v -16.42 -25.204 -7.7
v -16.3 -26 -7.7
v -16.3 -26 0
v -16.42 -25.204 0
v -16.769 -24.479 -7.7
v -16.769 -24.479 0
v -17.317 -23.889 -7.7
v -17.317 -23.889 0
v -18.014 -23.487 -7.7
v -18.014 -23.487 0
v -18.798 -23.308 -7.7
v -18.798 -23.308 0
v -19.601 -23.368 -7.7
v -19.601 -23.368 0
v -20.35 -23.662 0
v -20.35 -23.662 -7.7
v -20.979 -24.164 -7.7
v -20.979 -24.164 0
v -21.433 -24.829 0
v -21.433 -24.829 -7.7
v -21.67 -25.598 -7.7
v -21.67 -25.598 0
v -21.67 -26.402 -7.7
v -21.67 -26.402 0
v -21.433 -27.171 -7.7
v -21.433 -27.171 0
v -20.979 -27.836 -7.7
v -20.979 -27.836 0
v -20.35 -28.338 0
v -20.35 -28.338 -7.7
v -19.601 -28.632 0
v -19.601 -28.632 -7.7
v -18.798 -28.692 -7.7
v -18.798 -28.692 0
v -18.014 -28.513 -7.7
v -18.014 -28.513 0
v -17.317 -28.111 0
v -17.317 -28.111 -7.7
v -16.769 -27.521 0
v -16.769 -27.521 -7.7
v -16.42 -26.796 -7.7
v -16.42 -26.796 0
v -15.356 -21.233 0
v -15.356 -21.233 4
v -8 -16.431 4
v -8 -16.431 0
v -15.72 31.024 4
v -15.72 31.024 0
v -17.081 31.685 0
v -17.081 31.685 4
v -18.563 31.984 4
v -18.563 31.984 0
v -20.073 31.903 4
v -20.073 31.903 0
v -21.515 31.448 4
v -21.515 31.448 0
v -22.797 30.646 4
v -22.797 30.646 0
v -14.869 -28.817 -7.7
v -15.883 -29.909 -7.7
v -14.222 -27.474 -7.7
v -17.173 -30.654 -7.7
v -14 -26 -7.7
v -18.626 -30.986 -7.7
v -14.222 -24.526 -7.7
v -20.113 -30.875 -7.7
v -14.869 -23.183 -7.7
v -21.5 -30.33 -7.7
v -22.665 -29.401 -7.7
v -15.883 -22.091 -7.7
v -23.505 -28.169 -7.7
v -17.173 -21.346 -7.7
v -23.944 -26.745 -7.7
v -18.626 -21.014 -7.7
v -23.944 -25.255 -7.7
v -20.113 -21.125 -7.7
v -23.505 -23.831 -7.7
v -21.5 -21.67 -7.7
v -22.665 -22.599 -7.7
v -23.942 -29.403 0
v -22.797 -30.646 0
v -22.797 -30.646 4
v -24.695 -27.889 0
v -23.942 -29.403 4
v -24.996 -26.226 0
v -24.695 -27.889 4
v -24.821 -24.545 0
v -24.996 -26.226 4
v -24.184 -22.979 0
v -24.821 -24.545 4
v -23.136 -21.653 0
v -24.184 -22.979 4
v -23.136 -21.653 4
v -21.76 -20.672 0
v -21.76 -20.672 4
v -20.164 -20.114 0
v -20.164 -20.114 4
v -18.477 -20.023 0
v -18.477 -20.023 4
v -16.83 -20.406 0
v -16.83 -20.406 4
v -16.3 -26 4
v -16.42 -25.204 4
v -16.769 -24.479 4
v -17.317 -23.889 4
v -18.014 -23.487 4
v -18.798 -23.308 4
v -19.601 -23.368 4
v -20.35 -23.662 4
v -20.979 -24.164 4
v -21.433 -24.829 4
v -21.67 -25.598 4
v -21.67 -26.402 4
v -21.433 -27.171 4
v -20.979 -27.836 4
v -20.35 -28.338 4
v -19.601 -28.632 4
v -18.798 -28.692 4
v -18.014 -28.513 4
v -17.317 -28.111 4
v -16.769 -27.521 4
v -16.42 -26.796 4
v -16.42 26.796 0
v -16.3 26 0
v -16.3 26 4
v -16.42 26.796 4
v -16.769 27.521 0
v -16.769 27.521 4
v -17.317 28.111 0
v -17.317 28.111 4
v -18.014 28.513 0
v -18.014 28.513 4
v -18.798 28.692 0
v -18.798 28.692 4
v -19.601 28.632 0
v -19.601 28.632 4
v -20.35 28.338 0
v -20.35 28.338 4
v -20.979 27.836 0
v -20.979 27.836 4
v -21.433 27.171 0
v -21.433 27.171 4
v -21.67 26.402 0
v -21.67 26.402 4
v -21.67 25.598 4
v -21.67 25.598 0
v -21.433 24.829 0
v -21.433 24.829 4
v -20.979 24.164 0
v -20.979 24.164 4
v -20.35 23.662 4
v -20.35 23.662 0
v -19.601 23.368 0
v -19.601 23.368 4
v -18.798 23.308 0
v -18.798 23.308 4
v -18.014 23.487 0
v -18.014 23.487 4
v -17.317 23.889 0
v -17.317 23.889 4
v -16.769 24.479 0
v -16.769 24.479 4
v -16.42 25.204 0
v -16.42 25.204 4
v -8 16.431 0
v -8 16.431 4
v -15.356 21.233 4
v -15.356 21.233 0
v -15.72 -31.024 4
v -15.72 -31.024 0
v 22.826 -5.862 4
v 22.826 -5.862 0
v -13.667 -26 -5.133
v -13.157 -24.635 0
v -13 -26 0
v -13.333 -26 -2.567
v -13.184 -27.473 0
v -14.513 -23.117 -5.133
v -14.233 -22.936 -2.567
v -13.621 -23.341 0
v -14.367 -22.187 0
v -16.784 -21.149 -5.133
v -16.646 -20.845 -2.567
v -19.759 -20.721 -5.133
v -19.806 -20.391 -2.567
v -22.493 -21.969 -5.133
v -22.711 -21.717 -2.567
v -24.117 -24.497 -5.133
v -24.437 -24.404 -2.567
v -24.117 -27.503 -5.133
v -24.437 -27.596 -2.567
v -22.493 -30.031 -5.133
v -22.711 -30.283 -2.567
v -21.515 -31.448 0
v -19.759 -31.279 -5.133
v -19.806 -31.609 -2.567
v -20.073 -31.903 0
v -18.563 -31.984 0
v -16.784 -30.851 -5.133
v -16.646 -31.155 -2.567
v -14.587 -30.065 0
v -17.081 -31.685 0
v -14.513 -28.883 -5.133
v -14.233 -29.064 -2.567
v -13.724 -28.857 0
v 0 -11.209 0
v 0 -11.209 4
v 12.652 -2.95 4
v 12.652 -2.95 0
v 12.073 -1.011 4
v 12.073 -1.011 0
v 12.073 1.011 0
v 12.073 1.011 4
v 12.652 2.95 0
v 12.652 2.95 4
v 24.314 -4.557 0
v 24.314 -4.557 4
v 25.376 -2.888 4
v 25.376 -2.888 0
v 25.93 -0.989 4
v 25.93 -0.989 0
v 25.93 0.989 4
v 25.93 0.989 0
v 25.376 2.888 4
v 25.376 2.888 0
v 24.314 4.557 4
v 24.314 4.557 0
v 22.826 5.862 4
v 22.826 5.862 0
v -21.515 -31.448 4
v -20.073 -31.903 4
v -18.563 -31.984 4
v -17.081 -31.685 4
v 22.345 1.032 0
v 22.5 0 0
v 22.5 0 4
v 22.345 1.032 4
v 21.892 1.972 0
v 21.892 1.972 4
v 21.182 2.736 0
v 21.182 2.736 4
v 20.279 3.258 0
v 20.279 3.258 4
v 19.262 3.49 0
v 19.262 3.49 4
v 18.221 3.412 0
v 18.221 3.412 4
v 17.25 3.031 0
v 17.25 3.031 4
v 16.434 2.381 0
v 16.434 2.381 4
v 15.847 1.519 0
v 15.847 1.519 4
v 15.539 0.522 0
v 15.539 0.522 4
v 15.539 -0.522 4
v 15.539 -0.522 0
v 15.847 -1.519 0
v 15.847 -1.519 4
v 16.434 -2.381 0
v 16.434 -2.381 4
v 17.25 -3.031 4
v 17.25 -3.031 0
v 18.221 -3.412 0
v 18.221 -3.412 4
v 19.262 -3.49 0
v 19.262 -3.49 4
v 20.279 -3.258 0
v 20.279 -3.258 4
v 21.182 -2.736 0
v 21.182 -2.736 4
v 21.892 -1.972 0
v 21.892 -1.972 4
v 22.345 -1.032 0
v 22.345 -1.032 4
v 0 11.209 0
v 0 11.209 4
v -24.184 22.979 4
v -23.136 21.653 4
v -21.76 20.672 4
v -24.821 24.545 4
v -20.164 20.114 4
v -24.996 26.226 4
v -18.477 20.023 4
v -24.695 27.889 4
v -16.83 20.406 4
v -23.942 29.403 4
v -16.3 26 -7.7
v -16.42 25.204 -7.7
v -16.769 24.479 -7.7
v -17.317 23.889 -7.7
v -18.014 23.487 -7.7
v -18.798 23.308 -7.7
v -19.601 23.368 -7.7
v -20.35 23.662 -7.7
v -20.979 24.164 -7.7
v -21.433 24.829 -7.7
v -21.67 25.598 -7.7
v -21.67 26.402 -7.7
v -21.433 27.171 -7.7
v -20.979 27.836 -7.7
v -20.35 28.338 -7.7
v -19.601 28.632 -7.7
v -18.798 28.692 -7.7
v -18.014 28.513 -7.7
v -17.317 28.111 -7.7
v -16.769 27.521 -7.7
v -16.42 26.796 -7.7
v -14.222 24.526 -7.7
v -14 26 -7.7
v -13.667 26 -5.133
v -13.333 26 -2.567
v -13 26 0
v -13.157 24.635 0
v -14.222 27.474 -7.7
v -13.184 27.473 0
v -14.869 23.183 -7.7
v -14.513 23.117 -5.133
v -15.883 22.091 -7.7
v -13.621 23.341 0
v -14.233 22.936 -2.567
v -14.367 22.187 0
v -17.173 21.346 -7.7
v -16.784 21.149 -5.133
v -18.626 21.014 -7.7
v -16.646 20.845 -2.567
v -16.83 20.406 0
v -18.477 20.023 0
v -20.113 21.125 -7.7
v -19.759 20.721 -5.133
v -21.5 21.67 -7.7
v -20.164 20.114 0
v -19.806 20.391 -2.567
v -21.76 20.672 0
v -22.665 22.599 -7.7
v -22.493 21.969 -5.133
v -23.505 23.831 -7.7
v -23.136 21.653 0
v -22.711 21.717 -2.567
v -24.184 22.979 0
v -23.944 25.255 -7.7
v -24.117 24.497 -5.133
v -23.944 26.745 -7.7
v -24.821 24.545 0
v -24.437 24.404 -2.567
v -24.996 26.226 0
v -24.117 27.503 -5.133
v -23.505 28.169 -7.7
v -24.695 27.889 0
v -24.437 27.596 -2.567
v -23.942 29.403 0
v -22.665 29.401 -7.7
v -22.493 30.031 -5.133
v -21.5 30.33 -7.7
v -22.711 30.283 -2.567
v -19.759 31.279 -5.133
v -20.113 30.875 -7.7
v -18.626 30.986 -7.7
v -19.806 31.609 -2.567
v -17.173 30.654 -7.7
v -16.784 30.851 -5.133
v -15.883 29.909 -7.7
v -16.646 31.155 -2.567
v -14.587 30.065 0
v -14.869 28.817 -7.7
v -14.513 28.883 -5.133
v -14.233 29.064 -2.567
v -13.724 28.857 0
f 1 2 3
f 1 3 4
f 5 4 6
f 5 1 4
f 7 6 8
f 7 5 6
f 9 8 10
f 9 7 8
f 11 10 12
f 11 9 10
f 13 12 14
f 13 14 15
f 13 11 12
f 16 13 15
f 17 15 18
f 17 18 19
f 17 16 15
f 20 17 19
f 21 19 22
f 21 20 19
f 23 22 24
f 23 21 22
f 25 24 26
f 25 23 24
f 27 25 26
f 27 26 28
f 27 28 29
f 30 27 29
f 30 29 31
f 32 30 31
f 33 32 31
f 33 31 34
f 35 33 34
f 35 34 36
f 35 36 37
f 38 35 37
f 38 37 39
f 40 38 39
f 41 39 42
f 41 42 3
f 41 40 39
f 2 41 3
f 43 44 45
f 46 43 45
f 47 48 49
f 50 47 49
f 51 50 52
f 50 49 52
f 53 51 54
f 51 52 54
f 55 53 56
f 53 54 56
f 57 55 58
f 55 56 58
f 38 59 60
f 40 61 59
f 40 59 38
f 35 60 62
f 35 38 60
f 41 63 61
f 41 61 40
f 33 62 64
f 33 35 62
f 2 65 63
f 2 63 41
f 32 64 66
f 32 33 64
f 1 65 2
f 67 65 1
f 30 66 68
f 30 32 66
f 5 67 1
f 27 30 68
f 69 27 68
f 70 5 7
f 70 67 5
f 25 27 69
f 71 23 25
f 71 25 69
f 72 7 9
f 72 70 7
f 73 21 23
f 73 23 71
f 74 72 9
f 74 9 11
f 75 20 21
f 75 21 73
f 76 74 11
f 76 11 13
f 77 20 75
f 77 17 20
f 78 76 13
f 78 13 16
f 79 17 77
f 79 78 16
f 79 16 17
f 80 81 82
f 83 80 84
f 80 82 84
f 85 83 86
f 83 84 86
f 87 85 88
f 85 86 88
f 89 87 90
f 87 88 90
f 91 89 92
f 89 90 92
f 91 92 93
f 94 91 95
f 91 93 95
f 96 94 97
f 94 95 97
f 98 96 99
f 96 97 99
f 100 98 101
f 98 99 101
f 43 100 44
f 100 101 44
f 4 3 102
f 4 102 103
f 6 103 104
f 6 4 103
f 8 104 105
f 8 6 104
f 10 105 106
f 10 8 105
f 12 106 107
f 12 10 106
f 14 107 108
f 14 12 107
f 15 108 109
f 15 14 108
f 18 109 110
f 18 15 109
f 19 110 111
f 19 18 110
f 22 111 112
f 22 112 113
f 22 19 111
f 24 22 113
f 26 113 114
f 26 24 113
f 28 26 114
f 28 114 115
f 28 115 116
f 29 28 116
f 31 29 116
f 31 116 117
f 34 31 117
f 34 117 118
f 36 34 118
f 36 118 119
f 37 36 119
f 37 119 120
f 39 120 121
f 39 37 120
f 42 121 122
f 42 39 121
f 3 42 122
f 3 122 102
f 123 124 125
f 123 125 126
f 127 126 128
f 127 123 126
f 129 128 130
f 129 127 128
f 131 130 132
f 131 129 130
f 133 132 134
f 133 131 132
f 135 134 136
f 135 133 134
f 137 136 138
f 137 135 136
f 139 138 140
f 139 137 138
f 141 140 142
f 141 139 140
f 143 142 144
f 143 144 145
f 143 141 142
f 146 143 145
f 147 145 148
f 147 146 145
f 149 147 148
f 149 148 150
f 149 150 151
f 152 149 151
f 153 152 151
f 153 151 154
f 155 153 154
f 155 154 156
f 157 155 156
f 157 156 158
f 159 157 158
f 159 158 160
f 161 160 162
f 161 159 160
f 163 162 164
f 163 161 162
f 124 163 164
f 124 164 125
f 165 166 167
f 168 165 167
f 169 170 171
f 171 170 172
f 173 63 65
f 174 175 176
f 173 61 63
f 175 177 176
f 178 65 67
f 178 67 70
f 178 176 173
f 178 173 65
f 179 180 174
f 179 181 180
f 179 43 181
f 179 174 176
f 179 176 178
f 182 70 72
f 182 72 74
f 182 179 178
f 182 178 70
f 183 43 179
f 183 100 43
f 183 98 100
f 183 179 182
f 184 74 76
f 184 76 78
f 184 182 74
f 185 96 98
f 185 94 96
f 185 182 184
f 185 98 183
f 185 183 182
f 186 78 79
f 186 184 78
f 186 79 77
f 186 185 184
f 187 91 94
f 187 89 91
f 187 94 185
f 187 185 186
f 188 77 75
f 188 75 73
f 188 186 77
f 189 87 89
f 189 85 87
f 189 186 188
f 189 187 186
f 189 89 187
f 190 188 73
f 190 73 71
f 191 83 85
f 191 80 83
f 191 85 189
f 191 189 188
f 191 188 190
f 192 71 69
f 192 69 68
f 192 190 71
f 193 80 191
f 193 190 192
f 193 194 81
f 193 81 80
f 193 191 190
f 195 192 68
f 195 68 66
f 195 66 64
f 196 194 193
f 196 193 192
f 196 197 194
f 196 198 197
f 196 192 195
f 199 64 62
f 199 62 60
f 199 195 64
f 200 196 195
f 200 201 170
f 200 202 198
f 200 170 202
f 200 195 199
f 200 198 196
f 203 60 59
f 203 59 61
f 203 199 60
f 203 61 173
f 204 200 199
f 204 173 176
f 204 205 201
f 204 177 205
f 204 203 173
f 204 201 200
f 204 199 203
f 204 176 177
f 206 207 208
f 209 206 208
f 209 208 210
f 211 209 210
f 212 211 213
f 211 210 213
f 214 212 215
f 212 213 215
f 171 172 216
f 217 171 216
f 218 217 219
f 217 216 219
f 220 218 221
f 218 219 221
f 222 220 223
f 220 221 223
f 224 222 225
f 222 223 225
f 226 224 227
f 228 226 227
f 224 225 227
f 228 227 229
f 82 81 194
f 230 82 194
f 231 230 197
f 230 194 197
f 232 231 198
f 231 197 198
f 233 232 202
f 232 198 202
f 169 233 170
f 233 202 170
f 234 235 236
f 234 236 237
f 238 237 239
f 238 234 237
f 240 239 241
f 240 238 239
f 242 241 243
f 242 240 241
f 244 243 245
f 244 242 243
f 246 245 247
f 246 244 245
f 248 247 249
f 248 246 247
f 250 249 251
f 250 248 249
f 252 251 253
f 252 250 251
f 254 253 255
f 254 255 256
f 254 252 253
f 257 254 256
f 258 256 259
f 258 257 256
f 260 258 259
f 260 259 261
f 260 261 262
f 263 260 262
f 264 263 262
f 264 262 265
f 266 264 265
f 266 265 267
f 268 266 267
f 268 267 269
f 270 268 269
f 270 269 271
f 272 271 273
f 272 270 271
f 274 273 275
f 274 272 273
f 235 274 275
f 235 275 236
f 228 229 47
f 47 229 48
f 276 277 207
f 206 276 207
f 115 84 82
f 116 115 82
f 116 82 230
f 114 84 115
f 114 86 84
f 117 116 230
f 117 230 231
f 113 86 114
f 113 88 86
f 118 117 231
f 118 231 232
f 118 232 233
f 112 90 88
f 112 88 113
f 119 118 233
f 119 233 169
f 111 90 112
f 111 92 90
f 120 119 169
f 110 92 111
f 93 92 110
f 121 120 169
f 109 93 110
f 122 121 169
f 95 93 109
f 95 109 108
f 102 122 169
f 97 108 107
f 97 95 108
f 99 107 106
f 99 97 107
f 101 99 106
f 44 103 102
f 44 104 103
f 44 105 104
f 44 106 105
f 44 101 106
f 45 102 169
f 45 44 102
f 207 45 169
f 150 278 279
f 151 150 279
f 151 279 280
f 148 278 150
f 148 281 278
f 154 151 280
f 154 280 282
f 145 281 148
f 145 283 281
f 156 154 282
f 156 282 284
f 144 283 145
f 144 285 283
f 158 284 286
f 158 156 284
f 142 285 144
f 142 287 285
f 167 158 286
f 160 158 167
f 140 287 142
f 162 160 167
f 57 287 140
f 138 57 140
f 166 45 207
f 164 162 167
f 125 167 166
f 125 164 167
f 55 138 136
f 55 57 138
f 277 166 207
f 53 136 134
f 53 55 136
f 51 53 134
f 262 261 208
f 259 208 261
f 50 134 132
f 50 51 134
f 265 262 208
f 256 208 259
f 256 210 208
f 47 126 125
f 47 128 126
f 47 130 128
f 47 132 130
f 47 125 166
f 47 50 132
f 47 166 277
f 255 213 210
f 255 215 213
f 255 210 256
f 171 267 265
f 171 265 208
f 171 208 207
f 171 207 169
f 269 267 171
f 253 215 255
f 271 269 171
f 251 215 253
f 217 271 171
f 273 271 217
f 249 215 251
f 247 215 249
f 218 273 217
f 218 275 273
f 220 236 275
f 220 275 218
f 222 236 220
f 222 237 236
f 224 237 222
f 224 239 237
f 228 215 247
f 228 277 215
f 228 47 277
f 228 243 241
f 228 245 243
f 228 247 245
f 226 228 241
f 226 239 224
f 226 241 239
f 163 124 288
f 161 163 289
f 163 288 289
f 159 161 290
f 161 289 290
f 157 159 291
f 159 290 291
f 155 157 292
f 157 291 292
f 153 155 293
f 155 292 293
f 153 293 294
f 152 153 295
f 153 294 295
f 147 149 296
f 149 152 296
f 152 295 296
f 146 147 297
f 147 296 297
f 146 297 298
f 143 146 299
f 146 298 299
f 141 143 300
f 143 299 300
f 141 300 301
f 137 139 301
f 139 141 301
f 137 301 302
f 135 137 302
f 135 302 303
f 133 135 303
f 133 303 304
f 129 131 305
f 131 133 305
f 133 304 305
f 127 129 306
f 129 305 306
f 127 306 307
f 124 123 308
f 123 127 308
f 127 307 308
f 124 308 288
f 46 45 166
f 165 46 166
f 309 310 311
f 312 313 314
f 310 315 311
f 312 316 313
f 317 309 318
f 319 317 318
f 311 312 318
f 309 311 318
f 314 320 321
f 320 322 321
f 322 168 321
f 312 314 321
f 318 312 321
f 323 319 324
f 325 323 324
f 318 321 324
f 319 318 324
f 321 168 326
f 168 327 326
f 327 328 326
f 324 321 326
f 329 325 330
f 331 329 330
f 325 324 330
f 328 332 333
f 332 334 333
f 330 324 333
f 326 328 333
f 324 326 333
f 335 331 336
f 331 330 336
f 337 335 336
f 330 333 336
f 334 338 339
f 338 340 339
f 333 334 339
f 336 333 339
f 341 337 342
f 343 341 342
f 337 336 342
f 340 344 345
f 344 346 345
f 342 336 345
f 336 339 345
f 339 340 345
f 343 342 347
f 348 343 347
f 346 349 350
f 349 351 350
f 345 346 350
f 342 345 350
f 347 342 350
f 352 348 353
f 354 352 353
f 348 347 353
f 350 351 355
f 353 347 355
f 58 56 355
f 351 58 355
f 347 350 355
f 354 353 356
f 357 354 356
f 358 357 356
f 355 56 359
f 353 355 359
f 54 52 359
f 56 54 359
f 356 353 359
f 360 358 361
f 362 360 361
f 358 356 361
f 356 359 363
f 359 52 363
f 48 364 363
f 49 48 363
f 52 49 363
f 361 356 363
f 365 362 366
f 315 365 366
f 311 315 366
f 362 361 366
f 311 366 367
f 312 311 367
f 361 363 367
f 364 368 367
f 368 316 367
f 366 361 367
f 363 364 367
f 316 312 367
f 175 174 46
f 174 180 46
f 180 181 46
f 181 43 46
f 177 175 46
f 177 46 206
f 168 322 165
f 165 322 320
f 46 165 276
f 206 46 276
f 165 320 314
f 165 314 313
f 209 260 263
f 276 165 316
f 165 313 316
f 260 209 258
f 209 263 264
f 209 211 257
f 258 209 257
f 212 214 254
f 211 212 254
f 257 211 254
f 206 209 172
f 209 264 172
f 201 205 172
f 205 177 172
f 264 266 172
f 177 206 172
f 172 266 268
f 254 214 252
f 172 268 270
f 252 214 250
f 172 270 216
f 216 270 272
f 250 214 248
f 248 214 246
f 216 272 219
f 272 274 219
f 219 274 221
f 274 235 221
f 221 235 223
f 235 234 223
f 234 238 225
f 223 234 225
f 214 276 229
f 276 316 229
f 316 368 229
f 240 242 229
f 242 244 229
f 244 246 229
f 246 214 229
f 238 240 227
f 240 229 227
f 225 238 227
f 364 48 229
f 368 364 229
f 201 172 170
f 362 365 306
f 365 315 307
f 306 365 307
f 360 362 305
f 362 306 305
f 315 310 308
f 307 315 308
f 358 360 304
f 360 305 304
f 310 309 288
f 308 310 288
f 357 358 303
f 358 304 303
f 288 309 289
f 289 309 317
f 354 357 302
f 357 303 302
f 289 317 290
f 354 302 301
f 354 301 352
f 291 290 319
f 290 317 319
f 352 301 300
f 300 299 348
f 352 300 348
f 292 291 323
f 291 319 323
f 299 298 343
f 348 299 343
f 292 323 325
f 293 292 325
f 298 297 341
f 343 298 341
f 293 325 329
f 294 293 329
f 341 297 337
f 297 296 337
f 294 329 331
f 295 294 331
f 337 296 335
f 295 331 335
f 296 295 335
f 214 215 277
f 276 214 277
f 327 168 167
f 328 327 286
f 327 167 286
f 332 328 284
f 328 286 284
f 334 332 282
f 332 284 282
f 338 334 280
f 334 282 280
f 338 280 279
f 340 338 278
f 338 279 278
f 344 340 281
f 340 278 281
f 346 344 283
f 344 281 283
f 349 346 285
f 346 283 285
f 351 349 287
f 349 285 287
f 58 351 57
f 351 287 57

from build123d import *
from build123d.topology import SkipClean

# Parameters (mm, degrees)
SKETCH_1_R          = 2.2
SKETCH_1_R_2        = 3.5
SKETCH_1_R_3        = 2.7
EXTRUDE_1_DEPTH     = 4
SKETCH_5_R          = 2.2
CUT_EXTRUDE_1_DEPTH = 57.443688753


with BuildPart() as part:
    # 草图1 → 凸台-拉伸1 (new body)
    with BuildSketch(Plane.XY):
        with BuildLine():
            Line((-45, -12.5), (-22.796873936, -30.645831284))
            ThreePointArc((-22.796873936, -30.645831284), (-19.320397567, -31.991439343), (-15.720242852, -31.024260448))
            Line((-15.720242852, -31.024260448), (22.82638334, -5.861637189))
            ThreePointArc((22.82638334, -5.861637189), (26, 0), (22.82638334, 5.861637189))
            Line((22.82638334, 5.861637189), (-15.720242852, 31.024260448))
            ThreePointArc((-15.720242852, 31.024260448), (-19.320397567, 31.991439343), (-22.796873936, 30.645831284))
            Line((-22.796873936, 30.645831284), (-45, 12.5))
            Line((-45, 12.5), (-45, -12.5))
        make_face()
        with Locations((-35, 0)):
            Circle(SKETCH_1_R, mode=Mode.SUBTRACT)
        with Locations((-19, 0)):
            Circle(SKETCH_1_R, mode=Mode.SUBTRACT)
        with Locations((19, 0)):
            Circle(SKETCH_1_R_2, mode=Mode.SUBTRACT)
        with Locations((-19, -26)):
            Circle(SKETCH_1_R_3, mode=Mode.SUBTRACT)
        with Locations((-19, 26)):
            Circle(SKETCH_1_R_3, mode=Mode.SUBTRACT)
    extrude(amount=EXTRUDE_1_DEPTH)

    # 草图4 → 旋转1 (revolve)
    with SkipClean():  # the faces are left unmerged after this step: merging them gives an invalid solid
        with BuildSketch(Plane(origin=(-25.223829861, 16.46571414, 0), x_dir=(0, 0, -1), z_dir=(0.8373767412950733, -0.5466261914124163, 0))):
            Polygon((7.7, 16.385897637), (0, 17.385897637), (0, 14.085897637), (7.7, 14.085897637), align=None)
        revolve_1 = revolve(axis=Axis((-19, 26, 1000.278995542), (0, 0, -1)))

    # 镜向1: 旋转1 across plane
    with SkipClean():  # the faces are left unmerged after this step: merging them gives an invalid solid
        add(revolve_1.mirror(Plane.ZX))

    # 草图5 → 切除-拉伸1 (cut, through all)
    # profile 1 of 2: a face of its own
    with SkipClean():  # the faces are left unmerged after this step: merging them gives an invalid solid
        with BuildSketch(Plane.XY.offset(4)):
            with BuildLine():
                Line((-8, 16.430964093), (-15.356334205, 21.233061824))
                ThreePointArc((-15.356334205, 21.233061824), (-23.707008117, 22.279237365), (-22.796873936, 30.645831284))
                Line((-22.796873936, 30.645831284), (-45, 12.5))
                Line((-45, 12.5), (-45, -12.5))
                Line((-45, -12.5), (-22.796873936, -30.645831284))
                ThreePointArc((-22.796873936, -30.645831284), (-23.707008117, -22.279237365), (-15.356334205, -21.233061824))
                Line((-15.356334205, -21.233061824), (-8, -16.430964093))
                Line((-8, -16.430964093), (-8, 16.430964093))
            make_face()
            with Locations((-35, 0)):
                Circle(SKETCH_5_R, mode=Mode.SUBTRACT)
            with Locations((-19, 0)):
                Circle(SKETCH_5_R, mode=Mode.SUBTRACT)
        # profile 2 of 2: a face of its own
        with BuildSketch(Plane.XY.offset(4)):
            with BuildLine():
                Line((12.651857565, 2.949760604), (0, 11.208691589))
                Line((0, 11.208691589), (0, -11.208691589))
                Line((0, -11.208691589), (12.651857565, -2.949760604))
                ThreePointArc((12.651857565, -2.949760604), (12, 0), (12.651857565, 2.949760604))
            make_face()
        extrude(amount=-CUT_EXTRUDE_1_DEPTH, mode=Mode.SUBTRACT)


solid = part.part
